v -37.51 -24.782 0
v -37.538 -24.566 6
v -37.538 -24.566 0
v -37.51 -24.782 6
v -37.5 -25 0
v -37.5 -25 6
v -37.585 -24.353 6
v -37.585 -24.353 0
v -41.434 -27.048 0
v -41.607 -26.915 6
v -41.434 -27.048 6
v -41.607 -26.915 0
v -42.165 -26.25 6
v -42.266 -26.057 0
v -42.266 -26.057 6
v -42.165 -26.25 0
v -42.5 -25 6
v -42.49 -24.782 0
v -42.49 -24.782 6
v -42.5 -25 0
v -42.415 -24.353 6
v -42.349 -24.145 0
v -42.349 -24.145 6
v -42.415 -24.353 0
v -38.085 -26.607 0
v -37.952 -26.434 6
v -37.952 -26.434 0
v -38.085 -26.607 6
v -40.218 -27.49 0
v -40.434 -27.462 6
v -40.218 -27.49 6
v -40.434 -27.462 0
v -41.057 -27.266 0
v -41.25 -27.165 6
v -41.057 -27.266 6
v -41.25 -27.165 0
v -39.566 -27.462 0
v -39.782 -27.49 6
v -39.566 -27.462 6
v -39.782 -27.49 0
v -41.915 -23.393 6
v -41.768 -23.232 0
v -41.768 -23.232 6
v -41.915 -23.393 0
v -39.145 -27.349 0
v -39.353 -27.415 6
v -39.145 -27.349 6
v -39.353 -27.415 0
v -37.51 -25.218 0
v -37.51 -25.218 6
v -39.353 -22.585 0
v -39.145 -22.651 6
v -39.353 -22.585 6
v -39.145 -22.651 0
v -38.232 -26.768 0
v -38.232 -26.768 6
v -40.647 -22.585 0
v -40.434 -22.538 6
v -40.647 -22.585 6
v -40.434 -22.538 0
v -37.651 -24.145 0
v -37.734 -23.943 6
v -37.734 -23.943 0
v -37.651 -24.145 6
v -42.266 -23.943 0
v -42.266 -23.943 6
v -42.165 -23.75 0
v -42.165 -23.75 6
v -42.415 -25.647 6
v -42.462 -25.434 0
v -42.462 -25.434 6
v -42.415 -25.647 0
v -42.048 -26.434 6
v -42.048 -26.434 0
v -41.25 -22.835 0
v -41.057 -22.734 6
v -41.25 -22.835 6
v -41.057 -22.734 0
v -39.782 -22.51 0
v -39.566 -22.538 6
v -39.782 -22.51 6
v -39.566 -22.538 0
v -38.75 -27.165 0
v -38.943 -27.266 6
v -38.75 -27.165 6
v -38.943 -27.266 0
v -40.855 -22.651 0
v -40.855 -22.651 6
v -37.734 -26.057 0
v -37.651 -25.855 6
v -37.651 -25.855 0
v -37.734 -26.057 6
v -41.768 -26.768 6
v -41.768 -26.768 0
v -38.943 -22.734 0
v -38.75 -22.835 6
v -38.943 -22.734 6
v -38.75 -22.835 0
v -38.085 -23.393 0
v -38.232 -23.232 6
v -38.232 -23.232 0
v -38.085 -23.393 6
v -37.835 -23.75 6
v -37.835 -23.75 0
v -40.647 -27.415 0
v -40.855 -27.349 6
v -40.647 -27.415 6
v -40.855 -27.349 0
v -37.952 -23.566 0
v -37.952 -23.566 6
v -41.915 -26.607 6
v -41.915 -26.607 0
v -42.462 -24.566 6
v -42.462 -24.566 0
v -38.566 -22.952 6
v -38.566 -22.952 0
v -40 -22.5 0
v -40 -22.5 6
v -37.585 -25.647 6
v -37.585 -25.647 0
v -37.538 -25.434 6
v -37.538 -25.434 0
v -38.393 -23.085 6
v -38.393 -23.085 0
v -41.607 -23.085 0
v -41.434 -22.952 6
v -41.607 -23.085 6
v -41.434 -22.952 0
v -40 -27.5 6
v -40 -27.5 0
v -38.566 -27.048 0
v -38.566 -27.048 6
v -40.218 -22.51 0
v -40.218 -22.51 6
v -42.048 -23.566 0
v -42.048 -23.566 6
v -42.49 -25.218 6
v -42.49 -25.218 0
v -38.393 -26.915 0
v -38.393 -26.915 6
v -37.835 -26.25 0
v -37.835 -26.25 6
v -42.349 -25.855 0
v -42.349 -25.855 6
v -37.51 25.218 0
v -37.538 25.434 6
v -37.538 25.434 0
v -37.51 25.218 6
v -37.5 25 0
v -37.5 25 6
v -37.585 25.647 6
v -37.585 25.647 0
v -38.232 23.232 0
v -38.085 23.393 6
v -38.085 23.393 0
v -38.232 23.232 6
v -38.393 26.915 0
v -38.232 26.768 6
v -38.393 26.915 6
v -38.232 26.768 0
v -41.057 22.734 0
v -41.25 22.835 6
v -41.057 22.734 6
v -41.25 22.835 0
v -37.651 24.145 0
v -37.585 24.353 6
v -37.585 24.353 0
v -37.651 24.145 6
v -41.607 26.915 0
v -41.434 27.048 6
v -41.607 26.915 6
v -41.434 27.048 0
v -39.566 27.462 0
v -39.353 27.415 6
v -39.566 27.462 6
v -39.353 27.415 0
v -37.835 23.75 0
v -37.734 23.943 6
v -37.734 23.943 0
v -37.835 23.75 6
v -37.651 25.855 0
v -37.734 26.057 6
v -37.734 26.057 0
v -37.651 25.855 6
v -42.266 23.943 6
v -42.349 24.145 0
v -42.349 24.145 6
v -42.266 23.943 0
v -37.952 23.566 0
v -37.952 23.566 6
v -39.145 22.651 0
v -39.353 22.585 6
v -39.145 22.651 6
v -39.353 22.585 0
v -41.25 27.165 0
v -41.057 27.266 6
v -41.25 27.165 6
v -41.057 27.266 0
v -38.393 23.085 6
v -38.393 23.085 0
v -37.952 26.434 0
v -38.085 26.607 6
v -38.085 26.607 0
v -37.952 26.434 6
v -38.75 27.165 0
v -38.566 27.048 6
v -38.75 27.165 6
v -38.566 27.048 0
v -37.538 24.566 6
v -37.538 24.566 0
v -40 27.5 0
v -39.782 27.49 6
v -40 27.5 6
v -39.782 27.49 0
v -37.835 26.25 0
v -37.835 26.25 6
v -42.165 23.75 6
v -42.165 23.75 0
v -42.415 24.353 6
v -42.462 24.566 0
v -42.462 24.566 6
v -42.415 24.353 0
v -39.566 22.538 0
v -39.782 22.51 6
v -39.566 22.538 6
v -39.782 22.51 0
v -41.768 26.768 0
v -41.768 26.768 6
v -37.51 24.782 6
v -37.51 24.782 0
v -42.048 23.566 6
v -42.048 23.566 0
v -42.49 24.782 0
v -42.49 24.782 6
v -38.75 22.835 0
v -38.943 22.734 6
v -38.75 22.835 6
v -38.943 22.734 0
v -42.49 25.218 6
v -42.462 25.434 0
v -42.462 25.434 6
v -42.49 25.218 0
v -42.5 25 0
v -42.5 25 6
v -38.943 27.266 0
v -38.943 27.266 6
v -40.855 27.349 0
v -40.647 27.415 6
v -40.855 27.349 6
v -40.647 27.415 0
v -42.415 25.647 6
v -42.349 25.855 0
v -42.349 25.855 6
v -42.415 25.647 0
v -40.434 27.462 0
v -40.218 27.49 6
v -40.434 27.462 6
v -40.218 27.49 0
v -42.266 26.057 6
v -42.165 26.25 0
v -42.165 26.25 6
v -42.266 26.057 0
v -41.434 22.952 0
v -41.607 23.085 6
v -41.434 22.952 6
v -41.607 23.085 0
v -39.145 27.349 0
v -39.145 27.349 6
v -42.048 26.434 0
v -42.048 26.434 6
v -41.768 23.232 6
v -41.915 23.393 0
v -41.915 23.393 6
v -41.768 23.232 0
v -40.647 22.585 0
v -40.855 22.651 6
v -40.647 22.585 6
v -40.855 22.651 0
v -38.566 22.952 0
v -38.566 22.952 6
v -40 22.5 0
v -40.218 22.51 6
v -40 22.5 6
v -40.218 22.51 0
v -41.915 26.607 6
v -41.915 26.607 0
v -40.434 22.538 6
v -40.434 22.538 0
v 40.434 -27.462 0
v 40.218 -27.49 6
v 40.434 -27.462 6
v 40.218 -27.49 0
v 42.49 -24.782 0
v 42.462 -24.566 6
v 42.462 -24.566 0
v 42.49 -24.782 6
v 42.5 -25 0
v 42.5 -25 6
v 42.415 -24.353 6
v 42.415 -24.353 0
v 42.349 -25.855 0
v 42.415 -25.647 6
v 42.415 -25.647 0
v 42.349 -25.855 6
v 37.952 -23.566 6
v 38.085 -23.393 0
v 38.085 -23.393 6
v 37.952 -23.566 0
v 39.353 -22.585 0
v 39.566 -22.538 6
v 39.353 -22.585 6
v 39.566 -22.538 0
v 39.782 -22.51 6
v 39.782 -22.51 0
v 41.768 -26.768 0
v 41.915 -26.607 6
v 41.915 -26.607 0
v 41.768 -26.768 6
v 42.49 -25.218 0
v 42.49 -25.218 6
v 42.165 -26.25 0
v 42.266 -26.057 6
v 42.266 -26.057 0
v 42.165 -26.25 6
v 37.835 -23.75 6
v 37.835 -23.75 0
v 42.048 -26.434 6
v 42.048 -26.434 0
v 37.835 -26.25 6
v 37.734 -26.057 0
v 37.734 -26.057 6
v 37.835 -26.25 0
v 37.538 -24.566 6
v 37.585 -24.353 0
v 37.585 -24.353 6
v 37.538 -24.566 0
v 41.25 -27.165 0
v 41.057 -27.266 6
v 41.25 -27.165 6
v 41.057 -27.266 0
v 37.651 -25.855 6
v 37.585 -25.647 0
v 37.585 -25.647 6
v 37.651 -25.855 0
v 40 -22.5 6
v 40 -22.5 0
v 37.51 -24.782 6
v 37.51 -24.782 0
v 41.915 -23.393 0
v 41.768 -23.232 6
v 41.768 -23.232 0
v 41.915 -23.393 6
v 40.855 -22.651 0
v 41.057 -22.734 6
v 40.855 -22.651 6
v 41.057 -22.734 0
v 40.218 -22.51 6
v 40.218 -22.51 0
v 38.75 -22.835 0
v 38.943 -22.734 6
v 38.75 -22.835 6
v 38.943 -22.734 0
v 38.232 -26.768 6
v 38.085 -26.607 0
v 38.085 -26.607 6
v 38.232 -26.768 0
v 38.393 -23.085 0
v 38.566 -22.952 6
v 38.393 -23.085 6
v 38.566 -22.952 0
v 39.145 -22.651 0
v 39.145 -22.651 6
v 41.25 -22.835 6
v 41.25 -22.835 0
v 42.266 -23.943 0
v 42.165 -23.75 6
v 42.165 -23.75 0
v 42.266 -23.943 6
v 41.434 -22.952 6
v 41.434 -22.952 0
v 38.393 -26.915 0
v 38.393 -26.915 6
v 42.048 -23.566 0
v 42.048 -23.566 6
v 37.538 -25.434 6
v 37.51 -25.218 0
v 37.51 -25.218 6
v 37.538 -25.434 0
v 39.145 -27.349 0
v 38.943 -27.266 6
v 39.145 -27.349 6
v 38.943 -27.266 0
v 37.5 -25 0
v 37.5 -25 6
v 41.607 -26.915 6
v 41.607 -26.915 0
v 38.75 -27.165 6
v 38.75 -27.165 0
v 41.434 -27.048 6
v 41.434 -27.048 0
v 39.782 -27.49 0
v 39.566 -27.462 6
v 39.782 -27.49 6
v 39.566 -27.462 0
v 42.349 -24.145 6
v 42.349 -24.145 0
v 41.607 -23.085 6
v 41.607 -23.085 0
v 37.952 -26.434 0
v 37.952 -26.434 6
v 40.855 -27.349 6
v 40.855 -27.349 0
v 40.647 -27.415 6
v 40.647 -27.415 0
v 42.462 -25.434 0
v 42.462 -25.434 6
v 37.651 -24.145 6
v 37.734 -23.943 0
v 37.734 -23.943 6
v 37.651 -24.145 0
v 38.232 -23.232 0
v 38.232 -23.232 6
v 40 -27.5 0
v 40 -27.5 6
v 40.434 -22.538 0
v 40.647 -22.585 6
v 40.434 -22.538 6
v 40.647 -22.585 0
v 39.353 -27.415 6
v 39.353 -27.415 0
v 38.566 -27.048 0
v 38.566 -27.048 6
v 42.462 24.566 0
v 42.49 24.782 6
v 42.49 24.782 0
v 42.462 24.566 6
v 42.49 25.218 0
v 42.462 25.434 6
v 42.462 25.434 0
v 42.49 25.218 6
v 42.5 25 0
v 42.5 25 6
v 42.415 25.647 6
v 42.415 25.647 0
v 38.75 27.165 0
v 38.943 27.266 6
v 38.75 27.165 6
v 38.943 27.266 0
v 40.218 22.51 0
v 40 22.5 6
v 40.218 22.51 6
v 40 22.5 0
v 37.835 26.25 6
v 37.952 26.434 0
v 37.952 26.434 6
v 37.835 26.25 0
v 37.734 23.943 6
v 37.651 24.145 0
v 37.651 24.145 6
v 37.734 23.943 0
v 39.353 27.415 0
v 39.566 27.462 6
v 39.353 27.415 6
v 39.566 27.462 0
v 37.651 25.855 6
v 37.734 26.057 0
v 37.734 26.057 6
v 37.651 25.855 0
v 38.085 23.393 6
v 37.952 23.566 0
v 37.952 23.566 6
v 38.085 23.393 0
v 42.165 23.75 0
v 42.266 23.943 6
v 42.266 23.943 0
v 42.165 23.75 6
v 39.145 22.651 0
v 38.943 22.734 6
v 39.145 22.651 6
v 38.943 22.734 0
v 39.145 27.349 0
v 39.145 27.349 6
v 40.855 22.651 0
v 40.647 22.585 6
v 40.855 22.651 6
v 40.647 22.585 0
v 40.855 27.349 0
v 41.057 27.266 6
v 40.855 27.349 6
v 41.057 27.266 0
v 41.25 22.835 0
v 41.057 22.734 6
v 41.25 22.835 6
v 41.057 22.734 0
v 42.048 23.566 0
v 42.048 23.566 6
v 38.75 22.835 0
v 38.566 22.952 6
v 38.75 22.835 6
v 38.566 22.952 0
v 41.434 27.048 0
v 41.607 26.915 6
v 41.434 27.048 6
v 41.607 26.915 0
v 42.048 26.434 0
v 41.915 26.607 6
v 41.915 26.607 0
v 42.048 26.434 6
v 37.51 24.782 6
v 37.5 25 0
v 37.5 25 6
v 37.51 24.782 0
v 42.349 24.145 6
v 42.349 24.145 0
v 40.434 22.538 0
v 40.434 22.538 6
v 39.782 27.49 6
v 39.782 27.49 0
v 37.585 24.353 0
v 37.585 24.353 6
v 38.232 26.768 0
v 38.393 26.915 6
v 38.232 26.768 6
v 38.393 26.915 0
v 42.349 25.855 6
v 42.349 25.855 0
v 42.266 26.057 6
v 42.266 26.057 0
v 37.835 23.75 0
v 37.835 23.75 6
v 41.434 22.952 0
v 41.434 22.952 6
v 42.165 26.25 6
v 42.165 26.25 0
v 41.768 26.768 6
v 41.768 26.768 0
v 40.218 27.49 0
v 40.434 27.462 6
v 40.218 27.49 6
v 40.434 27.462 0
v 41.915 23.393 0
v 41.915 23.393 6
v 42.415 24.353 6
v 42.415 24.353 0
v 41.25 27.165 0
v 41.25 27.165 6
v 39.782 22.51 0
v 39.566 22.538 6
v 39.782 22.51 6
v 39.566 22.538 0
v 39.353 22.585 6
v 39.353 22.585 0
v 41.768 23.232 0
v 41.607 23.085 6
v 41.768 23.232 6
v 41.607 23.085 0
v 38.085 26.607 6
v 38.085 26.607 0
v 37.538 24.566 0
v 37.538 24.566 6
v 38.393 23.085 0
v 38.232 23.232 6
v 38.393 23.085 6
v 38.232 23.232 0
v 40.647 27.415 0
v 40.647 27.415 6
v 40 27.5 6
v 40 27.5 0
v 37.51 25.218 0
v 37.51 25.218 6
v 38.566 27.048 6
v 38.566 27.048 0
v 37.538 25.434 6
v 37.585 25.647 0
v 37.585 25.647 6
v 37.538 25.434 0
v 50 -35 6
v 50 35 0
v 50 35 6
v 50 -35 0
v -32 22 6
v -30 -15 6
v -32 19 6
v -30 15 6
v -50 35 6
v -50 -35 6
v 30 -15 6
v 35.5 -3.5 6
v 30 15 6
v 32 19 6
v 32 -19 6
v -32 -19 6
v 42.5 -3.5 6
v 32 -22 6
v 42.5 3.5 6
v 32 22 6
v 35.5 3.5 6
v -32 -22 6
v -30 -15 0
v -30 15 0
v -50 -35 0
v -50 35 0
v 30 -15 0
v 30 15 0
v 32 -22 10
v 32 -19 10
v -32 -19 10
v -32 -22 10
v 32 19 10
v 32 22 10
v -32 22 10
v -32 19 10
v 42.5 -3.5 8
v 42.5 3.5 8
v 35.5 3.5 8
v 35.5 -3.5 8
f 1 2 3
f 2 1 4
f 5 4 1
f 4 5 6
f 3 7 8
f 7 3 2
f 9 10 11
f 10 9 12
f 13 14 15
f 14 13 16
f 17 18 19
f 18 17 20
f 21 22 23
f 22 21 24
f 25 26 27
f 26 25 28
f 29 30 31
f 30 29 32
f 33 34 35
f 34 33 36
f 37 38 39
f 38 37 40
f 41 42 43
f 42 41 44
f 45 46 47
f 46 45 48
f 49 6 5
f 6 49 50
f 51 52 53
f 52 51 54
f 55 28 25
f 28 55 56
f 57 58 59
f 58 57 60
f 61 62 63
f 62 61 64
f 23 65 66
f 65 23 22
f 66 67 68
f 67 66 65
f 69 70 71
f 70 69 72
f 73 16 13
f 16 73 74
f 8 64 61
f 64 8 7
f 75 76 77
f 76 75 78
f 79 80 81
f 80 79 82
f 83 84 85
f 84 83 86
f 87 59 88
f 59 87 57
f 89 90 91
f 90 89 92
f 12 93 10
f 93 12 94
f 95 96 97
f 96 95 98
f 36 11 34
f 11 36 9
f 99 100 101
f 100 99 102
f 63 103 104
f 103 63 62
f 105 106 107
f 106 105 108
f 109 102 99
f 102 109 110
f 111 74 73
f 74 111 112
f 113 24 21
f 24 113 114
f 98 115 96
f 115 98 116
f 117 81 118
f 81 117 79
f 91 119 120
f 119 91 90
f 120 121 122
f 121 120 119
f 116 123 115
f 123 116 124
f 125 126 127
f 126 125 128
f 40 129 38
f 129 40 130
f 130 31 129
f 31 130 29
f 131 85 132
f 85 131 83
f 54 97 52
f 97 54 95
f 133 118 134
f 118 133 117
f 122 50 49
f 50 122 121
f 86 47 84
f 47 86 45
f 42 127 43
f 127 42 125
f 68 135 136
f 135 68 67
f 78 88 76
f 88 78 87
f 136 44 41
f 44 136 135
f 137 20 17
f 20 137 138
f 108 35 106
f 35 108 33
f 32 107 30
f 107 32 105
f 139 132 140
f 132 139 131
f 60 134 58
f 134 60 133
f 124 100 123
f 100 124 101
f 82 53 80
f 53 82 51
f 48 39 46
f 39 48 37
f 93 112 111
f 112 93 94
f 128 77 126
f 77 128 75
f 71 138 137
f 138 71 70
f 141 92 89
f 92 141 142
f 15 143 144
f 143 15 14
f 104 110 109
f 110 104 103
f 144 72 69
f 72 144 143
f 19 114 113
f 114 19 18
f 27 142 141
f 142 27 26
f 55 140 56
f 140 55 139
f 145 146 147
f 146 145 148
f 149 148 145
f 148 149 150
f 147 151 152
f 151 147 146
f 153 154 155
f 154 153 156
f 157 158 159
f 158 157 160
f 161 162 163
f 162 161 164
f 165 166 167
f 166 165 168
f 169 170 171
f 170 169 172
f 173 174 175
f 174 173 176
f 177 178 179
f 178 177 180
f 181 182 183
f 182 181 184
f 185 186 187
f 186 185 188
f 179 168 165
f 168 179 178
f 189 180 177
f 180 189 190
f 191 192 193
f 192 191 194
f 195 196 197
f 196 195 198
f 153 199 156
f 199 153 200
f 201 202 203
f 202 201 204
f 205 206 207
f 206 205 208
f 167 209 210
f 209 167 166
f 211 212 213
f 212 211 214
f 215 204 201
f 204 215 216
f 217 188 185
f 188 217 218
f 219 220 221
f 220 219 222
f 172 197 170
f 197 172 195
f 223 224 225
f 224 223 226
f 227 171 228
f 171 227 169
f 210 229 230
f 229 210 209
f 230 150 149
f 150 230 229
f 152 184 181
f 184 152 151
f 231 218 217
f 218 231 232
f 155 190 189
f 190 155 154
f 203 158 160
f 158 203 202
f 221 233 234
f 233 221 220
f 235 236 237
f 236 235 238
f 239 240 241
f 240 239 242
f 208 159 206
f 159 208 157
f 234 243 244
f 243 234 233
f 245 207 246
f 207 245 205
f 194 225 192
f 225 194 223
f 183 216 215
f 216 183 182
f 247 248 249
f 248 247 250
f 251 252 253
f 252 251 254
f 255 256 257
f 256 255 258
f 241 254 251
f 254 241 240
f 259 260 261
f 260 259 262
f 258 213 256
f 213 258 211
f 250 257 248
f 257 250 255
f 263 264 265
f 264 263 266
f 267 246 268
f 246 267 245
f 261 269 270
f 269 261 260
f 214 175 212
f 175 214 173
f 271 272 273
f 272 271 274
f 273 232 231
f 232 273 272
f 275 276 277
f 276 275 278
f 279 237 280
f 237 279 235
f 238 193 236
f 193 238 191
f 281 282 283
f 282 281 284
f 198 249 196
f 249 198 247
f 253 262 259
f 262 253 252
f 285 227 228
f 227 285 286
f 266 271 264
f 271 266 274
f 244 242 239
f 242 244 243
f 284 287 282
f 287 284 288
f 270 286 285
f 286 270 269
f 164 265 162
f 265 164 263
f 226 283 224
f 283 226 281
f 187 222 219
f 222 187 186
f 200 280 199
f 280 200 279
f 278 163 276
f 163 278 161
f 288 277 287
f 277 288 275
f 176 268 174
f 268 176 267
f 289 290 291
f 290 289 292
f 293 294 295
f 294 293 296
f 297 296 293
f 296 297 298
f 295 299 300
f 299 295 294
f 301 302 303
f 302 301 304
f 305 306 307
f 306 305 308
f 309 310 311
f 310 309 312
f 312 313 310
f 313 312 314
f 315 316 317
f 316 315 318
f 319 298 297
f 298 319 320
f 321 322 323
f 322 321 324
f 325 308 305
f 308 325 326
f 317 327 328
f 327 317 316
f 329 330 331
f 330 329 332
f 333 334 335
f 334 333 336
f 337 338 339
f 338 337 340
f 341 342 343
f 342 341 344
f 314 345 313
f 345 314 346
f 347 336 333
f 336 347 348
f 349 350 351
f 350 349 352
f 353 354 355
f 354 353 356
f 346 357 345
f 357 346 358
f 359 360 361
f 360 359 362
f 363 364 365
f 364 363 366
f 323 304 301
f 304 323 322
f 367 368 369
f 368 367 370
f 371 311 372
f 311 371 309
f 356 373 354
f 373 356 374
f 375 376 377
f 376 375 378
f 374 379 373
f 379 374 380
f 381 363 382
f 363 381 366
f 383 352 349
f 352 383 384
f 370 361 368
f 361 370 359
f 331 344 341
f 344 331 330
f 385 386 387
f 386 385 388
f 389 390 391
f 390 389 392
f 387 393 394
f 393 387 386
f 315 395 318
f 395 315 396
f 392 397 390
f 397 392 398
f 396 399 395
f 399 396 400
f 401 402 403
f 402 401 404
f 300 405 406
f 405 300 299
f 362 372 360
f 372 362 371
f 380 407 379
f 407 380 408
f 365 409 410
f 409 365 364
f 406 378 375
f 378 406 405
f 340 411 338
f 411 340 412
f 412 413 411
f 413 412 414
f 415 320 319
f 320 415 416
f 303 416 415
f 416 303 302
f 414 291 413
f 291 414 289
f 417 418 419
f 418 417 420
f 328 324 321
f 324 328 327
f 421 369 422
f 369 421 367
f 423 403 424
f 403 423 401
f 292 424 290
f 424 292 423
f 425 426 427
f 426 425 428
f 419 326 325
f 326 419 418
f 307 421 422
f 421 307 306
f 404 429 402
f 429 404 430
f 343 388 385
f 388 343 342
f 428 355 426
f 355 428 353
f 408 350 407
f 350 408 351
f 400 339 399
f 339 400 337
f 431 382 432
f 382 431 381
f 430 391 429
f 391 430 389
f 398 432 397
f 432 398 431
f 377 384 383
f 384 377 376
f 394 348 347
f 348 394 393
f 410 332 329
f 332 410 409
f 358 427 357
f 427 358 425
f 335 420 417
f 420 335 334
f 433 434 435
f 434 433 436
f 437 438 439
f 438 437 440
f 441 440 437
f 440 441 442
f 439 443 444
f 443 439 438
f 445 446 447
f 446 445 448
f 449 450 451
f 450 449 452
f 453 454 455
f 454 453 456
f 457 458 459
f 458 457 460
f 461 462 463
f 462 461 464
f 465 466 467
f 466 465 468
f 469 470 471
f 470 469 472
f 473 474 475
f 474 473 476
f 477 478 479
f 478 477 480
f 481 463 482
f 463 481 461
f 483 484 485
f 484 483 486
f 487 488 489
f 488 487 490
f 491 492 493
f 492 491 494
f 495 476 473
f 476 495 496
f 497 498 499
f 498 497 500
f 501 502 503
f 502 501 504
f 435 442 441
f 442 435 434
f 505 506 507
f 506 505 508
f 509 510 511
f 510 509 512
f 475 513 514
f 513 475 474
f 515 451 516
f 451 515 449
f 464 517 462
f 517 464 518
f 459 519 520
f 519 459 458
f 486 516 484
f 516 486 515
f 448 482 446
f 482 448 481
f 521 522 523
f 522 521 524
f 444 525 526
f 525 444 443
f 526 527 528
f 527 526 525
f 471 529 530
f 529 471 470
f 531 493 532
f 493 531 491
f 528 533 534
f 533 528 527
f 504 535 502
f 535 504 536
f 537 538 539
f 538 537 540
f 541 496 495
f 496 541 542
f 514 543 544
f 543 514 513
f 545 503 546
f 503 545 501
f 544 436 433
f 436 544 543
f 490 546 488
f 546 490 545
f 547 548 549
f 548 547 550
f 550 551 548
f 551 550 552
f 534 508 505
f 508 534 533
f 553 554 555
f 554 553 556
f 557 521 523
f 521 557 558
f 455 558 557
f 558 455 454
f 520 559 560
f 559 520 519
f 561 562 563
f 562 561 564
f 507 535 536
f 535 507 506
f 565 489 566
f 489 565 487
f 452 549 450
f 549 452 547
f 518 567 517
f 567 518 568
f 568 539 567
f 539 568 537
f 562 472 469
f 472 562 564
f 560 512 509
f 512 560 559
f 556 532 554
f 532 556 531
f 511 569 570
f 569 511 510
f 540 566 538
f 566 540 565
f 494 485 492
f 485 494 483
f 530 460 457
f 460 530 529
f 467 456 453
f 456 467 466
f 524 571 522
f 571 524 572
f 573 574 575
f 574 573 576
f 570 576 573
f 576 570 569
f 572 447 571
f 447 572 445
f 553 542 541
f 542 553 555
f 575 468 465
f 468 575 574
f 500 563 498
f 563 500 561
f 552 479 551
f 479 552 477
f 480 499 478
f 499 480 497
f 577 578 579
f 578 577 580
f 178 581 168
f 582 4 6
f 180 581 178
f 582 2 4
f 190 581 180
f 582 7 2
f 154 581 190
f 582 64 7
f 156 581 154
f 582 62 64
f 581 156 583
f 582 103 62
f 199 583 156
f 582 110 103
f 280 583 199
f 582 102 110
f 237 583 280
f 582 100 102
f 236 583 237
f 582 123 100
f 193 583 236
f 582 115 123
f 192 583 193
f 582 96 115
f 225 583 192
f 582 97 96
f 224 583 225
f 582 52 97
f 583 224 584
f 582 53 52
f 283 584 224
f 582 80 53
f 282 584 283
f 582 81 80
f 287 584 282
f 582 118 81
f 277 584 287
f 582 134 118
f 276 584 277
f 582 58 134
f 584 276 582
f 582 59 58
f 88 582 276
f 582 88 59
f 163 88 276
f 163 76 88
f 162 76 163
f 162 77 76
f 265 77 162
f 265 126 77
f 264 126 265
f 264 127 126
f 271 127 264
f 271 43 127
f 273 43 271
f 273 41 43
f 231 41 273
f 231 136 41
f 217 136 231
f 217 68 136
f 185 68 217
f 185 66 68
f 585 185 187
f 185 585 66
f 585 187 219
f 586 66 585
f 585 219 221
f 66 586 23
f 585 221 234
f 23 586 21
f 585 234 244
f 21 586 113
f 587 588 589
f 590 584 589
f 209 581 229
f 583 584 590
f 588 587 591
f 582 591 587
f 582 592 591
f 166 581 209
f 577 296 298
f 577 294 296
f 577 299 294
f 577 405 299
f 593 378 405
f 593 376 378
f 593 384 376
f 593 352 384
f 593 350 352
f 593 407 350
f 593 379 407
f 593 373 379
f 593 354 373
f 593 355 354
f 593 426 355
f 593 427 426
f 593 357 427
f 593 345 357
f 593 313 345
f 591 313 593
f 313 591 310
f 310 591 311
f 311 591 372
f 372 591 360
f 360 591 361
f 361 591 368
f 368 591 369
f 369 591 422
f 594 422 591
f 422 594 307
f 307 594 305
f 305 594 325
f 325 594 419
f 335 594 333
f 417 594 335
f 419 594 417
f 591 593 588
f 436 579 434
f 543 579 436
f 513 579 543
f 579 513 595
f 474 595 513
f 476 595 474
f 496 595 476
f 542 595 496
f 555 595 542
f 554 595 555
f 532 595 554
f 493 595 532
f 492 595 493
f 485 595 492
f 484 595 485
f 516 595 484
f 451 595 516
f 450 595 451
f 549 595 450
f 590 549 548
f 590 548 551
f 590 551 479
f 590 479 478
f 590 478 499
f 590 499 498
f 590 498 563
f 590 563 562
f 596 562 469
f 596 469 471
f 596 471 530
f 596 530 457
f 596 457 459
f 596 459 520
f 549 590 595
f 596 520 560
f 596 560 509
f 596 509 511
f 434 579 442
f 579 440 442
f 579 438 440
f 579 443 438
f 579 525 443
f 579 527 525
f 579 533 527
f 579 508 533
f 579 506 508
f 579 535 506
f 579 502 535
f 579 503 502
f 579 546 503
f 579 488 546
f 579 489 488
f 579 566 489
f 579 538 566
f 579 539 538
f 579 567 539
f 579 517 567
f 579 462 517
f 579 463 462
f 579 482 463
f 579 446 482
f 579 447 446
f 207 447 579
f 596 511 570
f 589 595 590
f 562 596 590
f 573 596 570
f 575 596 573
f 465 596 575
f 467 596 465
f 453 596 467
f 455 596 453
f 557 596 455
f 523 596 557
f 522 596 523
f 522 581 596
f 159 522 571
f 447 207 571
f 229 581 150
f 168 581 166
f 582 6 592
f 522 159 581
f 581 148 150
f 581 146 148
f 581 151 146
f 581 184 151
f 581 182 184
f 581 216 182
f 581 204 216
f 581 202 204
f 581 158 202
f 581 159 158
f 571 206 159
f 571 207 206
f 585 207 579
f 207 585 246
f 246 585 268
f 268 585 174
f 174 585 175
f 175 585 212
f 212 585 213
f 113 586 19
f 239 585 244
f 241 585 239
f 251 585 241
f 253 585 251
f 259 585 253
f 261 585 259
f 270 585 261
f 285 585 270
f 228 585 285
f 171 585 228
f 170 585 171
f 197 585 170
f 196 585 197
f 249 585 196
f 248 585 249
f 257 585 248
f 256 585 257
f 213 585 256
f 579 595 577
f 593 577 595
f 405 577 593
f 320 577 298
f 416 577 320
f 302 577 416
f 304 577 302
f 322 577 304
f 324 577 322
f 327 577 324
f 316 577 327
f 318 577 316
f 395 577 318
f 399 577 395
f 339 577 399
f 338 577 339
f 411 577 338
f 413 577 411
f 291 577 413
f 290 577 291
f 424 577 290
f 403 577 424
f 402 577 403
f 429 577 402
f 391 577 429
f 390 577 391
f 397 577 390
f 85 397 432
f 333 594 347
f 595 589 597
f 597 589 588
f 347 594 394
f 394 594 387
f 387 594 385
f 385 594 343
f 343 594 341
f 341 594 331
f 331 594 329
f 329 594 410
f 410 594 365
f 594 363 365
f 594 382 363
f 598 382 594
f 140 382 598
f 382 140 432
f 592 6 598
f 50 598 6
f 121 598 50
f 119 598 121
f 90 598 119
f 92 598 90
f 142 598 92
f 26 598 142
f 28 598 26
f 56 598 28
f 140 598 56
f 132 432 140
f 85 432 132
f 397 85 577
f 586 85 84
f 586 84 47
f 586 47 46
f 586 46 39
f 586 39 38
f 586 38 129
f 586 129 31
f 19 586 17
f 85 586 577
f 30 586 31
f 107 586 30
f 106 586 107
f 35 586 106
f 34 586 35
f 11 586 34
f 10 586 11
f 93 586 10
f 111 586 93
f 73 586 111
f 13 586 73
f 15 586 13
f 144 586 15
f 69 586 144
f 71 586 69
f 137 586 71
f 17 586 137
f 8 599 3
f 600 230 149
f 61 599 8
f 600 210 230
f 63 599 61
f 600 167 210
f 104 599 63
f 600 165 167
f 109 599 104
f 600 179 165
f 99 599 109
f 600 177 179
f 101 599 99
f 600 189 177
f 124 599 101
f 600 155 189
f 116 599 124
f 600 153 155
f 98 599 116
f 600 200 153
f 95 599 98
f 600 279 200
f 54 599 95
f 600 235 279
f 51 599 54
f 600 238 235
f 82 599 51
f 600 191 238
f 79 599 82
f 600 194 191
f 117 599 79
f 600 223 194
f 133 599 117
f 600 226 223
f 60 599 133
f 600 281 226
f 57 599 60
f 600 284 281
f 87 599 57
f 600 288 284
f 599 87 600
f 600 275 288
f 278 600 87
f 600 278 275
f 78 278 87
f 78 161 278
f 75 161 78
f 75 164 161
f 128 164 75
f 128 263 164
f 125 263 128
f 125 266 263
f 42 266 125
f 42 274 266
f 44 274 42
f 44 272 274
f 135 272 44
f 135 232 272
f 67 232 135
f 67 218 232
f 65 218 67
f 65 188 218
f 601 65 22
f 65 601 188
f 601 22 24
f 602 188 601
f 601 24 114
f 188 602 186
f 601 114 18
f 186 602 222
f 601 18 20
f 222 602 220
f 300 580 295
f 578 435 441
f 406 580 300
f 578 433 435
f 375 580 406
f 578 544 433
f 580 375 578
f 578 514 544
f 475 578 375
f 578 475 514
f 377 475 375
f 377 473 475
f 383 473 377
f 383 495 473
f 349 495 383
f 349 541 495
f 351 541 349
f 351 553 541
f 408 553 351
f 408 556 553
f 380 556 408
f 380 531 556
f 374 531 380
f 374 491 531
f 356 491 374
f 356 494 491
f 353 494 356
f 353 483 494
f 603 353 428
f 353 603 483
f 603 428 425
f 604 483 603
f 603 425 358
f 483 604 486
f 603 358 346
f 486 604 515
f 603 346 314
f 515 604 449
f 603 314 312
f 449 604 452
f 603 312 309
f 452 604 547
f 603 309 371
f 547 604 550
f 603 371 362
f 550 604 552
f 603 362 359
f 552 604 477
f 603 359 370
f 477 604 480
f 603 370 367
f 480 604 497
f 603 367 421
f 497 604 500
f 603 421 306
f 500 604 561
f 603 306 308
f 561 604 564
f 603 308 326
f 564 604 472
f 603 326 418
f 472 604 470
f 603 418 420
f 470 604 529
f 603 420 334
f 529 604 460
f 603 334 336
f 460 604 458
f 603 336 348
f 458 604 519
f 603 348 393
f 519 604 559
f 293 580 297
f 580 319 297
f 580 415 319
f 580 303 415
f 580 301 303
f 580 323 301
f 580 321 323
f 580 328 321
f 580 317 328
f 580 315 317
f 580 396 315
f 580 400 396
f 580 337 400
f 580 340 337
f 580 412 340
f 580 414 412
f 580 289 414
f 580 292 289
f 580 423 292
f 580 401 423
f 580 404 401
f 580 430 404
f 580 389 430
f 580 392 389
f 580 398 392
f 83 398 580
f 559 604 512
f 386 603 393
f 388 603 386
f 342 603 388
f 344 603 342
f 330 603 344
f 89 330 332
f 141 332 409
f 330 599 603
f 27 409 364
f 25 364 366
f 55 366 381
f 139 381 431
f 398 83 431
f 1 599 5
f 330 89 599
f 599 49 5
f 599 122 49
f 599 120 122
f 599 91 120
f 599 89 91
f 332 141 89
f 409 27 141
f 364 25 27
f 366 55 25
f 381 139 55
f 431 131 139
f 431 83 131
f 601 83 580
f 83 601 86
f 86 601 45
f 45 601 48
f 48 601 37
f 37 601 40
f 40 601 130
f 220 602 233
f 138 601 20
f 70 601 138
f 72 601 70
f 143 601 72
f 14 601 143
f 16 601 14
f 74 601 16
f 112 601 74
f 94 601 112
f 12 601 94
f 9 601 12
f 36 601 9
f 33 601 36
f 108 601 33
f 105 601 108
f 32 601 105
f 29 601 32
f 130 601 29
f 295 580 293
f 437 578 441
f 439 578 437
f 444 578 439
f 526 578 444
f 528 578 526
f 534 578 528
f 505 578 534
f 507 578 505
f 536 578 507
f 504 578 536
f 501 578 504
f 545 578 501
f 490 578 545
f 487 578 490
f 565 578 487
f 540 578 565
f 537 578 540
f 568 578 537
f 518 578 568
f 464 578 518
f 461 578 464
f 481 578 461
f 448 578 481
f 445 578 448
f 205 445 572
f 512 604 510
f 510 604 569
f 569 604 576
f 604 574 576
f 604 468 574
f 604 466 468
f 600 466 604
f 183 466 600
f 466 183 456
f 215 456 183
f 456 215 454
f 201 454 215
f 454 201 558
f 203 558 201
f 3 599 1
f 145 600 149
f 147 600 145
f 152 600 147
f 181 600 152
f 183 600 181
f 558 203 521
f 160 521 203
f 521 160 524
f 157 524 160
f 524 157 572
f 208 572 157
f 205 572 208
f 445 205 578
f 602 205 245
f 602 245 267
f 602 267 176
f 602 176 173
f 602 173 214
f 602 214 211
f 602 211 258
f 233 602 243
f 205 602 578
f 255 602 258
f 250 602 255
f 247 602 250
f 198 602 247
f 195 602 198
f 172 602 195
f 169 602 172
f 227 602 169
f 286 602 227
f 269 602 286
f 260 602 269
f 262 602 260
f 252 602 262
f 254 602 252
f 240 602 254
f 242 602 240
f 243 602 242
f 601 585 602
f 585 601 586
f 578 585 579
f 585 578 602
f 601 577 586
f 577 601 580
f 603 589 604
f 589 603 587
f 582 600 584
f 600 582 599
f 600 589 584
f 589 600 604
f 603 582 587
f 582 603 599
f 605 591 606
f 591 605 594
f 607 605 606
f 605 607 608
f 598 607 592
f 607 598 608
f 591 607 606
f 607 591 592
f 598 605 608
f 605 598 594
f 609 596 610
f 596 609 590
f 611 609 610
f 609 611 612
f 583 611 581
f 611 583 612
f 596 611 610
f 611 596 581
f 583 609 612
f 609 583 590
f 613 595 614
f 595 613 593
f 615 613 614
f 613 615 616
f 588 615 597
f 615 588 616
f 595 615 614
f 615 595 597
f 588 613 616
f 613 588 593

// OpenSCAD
// Microfluidic chip imaging holder — parametric lab-printable variant
// Category: tools; holds a flat microfluidic chip and exposes an unobstructed optical window
// Print flat, without supports; check actual chip fit before handling biological material
// SPDX-License-Identifier: CERN-OHL-P-2.0
/* [Dimensions (mm)] */
base_x=100;  // [80:1:120]
base_y=70;   // [60:1:100]
base_h=6;    // [4:0.5:12]
window_x=60; // [40:1:70]
window_y=30; // [20:1:40]
hole_d=5;    // [3:0.5:7]
mount_pitch_x=80;
mount_pitch_y=50;
rail_len=64;
rail_width=3;
rail_height=4;
rail_y=20.5;
/* [Hidden] */
marker_len=7;
marker_width=7;
marker_height=2;
marker_x=39;
eps=0.05;
$fn=72;
assert(base_x > window_x + 12, "base too narrow for window and rails");
assert(base_y > window_y + 12, "base too shallow for window and rails");
assert(mount_pitch_x/2 + hole_d/2 < base_x/2-0.8, "mounting hole hits outer edge");
assert(mount_pitch_y/2 + hole_d/2 < base_y/2-0.8, "mounting hole hits outer edge");
assert(rail_y-rail_width/2 > window_y/2+0.5, "rail would obstruct imaging window");
assert(rail_y+rail_width/2 < base_y/2-0.8, "rail would extend outside base");
assert(marker_x+marker_len/2 < base_x/2-0.8, "marker would protrude from base");
assert(rail_len < base_x-1.6, "rail would protrude beyond base ends");
union(){
 difference(){
  translate([-base_x/2,-base_y/2,0]) cube([base_x,base_y,base_h]);
  translate([-window_x/2,-window_y/2,-eps]) cube([window_x,window_y,base_h+2*eps]);
  for(x=[-mount_pitch_x/2,mount_pitch_x/2]) for(y=[-mount_pitch_y/2,mount_pitch_y/2])
   translate([x,y,-eps]) cylinder(d=hole_d,h=base_h+2*eps);
 }
 for(y=[-rail_y,rail_y])
  translate([-rail_len/2,y-rail_width/2,base_h-eps]) cube([rail_len,rail_width,rail_height+eps]);
 translate([marker_x-marker_len/2,-marker_width/2,base_h-eps]) cube([marker_len,marker_width,marker_height+eps]);
}
